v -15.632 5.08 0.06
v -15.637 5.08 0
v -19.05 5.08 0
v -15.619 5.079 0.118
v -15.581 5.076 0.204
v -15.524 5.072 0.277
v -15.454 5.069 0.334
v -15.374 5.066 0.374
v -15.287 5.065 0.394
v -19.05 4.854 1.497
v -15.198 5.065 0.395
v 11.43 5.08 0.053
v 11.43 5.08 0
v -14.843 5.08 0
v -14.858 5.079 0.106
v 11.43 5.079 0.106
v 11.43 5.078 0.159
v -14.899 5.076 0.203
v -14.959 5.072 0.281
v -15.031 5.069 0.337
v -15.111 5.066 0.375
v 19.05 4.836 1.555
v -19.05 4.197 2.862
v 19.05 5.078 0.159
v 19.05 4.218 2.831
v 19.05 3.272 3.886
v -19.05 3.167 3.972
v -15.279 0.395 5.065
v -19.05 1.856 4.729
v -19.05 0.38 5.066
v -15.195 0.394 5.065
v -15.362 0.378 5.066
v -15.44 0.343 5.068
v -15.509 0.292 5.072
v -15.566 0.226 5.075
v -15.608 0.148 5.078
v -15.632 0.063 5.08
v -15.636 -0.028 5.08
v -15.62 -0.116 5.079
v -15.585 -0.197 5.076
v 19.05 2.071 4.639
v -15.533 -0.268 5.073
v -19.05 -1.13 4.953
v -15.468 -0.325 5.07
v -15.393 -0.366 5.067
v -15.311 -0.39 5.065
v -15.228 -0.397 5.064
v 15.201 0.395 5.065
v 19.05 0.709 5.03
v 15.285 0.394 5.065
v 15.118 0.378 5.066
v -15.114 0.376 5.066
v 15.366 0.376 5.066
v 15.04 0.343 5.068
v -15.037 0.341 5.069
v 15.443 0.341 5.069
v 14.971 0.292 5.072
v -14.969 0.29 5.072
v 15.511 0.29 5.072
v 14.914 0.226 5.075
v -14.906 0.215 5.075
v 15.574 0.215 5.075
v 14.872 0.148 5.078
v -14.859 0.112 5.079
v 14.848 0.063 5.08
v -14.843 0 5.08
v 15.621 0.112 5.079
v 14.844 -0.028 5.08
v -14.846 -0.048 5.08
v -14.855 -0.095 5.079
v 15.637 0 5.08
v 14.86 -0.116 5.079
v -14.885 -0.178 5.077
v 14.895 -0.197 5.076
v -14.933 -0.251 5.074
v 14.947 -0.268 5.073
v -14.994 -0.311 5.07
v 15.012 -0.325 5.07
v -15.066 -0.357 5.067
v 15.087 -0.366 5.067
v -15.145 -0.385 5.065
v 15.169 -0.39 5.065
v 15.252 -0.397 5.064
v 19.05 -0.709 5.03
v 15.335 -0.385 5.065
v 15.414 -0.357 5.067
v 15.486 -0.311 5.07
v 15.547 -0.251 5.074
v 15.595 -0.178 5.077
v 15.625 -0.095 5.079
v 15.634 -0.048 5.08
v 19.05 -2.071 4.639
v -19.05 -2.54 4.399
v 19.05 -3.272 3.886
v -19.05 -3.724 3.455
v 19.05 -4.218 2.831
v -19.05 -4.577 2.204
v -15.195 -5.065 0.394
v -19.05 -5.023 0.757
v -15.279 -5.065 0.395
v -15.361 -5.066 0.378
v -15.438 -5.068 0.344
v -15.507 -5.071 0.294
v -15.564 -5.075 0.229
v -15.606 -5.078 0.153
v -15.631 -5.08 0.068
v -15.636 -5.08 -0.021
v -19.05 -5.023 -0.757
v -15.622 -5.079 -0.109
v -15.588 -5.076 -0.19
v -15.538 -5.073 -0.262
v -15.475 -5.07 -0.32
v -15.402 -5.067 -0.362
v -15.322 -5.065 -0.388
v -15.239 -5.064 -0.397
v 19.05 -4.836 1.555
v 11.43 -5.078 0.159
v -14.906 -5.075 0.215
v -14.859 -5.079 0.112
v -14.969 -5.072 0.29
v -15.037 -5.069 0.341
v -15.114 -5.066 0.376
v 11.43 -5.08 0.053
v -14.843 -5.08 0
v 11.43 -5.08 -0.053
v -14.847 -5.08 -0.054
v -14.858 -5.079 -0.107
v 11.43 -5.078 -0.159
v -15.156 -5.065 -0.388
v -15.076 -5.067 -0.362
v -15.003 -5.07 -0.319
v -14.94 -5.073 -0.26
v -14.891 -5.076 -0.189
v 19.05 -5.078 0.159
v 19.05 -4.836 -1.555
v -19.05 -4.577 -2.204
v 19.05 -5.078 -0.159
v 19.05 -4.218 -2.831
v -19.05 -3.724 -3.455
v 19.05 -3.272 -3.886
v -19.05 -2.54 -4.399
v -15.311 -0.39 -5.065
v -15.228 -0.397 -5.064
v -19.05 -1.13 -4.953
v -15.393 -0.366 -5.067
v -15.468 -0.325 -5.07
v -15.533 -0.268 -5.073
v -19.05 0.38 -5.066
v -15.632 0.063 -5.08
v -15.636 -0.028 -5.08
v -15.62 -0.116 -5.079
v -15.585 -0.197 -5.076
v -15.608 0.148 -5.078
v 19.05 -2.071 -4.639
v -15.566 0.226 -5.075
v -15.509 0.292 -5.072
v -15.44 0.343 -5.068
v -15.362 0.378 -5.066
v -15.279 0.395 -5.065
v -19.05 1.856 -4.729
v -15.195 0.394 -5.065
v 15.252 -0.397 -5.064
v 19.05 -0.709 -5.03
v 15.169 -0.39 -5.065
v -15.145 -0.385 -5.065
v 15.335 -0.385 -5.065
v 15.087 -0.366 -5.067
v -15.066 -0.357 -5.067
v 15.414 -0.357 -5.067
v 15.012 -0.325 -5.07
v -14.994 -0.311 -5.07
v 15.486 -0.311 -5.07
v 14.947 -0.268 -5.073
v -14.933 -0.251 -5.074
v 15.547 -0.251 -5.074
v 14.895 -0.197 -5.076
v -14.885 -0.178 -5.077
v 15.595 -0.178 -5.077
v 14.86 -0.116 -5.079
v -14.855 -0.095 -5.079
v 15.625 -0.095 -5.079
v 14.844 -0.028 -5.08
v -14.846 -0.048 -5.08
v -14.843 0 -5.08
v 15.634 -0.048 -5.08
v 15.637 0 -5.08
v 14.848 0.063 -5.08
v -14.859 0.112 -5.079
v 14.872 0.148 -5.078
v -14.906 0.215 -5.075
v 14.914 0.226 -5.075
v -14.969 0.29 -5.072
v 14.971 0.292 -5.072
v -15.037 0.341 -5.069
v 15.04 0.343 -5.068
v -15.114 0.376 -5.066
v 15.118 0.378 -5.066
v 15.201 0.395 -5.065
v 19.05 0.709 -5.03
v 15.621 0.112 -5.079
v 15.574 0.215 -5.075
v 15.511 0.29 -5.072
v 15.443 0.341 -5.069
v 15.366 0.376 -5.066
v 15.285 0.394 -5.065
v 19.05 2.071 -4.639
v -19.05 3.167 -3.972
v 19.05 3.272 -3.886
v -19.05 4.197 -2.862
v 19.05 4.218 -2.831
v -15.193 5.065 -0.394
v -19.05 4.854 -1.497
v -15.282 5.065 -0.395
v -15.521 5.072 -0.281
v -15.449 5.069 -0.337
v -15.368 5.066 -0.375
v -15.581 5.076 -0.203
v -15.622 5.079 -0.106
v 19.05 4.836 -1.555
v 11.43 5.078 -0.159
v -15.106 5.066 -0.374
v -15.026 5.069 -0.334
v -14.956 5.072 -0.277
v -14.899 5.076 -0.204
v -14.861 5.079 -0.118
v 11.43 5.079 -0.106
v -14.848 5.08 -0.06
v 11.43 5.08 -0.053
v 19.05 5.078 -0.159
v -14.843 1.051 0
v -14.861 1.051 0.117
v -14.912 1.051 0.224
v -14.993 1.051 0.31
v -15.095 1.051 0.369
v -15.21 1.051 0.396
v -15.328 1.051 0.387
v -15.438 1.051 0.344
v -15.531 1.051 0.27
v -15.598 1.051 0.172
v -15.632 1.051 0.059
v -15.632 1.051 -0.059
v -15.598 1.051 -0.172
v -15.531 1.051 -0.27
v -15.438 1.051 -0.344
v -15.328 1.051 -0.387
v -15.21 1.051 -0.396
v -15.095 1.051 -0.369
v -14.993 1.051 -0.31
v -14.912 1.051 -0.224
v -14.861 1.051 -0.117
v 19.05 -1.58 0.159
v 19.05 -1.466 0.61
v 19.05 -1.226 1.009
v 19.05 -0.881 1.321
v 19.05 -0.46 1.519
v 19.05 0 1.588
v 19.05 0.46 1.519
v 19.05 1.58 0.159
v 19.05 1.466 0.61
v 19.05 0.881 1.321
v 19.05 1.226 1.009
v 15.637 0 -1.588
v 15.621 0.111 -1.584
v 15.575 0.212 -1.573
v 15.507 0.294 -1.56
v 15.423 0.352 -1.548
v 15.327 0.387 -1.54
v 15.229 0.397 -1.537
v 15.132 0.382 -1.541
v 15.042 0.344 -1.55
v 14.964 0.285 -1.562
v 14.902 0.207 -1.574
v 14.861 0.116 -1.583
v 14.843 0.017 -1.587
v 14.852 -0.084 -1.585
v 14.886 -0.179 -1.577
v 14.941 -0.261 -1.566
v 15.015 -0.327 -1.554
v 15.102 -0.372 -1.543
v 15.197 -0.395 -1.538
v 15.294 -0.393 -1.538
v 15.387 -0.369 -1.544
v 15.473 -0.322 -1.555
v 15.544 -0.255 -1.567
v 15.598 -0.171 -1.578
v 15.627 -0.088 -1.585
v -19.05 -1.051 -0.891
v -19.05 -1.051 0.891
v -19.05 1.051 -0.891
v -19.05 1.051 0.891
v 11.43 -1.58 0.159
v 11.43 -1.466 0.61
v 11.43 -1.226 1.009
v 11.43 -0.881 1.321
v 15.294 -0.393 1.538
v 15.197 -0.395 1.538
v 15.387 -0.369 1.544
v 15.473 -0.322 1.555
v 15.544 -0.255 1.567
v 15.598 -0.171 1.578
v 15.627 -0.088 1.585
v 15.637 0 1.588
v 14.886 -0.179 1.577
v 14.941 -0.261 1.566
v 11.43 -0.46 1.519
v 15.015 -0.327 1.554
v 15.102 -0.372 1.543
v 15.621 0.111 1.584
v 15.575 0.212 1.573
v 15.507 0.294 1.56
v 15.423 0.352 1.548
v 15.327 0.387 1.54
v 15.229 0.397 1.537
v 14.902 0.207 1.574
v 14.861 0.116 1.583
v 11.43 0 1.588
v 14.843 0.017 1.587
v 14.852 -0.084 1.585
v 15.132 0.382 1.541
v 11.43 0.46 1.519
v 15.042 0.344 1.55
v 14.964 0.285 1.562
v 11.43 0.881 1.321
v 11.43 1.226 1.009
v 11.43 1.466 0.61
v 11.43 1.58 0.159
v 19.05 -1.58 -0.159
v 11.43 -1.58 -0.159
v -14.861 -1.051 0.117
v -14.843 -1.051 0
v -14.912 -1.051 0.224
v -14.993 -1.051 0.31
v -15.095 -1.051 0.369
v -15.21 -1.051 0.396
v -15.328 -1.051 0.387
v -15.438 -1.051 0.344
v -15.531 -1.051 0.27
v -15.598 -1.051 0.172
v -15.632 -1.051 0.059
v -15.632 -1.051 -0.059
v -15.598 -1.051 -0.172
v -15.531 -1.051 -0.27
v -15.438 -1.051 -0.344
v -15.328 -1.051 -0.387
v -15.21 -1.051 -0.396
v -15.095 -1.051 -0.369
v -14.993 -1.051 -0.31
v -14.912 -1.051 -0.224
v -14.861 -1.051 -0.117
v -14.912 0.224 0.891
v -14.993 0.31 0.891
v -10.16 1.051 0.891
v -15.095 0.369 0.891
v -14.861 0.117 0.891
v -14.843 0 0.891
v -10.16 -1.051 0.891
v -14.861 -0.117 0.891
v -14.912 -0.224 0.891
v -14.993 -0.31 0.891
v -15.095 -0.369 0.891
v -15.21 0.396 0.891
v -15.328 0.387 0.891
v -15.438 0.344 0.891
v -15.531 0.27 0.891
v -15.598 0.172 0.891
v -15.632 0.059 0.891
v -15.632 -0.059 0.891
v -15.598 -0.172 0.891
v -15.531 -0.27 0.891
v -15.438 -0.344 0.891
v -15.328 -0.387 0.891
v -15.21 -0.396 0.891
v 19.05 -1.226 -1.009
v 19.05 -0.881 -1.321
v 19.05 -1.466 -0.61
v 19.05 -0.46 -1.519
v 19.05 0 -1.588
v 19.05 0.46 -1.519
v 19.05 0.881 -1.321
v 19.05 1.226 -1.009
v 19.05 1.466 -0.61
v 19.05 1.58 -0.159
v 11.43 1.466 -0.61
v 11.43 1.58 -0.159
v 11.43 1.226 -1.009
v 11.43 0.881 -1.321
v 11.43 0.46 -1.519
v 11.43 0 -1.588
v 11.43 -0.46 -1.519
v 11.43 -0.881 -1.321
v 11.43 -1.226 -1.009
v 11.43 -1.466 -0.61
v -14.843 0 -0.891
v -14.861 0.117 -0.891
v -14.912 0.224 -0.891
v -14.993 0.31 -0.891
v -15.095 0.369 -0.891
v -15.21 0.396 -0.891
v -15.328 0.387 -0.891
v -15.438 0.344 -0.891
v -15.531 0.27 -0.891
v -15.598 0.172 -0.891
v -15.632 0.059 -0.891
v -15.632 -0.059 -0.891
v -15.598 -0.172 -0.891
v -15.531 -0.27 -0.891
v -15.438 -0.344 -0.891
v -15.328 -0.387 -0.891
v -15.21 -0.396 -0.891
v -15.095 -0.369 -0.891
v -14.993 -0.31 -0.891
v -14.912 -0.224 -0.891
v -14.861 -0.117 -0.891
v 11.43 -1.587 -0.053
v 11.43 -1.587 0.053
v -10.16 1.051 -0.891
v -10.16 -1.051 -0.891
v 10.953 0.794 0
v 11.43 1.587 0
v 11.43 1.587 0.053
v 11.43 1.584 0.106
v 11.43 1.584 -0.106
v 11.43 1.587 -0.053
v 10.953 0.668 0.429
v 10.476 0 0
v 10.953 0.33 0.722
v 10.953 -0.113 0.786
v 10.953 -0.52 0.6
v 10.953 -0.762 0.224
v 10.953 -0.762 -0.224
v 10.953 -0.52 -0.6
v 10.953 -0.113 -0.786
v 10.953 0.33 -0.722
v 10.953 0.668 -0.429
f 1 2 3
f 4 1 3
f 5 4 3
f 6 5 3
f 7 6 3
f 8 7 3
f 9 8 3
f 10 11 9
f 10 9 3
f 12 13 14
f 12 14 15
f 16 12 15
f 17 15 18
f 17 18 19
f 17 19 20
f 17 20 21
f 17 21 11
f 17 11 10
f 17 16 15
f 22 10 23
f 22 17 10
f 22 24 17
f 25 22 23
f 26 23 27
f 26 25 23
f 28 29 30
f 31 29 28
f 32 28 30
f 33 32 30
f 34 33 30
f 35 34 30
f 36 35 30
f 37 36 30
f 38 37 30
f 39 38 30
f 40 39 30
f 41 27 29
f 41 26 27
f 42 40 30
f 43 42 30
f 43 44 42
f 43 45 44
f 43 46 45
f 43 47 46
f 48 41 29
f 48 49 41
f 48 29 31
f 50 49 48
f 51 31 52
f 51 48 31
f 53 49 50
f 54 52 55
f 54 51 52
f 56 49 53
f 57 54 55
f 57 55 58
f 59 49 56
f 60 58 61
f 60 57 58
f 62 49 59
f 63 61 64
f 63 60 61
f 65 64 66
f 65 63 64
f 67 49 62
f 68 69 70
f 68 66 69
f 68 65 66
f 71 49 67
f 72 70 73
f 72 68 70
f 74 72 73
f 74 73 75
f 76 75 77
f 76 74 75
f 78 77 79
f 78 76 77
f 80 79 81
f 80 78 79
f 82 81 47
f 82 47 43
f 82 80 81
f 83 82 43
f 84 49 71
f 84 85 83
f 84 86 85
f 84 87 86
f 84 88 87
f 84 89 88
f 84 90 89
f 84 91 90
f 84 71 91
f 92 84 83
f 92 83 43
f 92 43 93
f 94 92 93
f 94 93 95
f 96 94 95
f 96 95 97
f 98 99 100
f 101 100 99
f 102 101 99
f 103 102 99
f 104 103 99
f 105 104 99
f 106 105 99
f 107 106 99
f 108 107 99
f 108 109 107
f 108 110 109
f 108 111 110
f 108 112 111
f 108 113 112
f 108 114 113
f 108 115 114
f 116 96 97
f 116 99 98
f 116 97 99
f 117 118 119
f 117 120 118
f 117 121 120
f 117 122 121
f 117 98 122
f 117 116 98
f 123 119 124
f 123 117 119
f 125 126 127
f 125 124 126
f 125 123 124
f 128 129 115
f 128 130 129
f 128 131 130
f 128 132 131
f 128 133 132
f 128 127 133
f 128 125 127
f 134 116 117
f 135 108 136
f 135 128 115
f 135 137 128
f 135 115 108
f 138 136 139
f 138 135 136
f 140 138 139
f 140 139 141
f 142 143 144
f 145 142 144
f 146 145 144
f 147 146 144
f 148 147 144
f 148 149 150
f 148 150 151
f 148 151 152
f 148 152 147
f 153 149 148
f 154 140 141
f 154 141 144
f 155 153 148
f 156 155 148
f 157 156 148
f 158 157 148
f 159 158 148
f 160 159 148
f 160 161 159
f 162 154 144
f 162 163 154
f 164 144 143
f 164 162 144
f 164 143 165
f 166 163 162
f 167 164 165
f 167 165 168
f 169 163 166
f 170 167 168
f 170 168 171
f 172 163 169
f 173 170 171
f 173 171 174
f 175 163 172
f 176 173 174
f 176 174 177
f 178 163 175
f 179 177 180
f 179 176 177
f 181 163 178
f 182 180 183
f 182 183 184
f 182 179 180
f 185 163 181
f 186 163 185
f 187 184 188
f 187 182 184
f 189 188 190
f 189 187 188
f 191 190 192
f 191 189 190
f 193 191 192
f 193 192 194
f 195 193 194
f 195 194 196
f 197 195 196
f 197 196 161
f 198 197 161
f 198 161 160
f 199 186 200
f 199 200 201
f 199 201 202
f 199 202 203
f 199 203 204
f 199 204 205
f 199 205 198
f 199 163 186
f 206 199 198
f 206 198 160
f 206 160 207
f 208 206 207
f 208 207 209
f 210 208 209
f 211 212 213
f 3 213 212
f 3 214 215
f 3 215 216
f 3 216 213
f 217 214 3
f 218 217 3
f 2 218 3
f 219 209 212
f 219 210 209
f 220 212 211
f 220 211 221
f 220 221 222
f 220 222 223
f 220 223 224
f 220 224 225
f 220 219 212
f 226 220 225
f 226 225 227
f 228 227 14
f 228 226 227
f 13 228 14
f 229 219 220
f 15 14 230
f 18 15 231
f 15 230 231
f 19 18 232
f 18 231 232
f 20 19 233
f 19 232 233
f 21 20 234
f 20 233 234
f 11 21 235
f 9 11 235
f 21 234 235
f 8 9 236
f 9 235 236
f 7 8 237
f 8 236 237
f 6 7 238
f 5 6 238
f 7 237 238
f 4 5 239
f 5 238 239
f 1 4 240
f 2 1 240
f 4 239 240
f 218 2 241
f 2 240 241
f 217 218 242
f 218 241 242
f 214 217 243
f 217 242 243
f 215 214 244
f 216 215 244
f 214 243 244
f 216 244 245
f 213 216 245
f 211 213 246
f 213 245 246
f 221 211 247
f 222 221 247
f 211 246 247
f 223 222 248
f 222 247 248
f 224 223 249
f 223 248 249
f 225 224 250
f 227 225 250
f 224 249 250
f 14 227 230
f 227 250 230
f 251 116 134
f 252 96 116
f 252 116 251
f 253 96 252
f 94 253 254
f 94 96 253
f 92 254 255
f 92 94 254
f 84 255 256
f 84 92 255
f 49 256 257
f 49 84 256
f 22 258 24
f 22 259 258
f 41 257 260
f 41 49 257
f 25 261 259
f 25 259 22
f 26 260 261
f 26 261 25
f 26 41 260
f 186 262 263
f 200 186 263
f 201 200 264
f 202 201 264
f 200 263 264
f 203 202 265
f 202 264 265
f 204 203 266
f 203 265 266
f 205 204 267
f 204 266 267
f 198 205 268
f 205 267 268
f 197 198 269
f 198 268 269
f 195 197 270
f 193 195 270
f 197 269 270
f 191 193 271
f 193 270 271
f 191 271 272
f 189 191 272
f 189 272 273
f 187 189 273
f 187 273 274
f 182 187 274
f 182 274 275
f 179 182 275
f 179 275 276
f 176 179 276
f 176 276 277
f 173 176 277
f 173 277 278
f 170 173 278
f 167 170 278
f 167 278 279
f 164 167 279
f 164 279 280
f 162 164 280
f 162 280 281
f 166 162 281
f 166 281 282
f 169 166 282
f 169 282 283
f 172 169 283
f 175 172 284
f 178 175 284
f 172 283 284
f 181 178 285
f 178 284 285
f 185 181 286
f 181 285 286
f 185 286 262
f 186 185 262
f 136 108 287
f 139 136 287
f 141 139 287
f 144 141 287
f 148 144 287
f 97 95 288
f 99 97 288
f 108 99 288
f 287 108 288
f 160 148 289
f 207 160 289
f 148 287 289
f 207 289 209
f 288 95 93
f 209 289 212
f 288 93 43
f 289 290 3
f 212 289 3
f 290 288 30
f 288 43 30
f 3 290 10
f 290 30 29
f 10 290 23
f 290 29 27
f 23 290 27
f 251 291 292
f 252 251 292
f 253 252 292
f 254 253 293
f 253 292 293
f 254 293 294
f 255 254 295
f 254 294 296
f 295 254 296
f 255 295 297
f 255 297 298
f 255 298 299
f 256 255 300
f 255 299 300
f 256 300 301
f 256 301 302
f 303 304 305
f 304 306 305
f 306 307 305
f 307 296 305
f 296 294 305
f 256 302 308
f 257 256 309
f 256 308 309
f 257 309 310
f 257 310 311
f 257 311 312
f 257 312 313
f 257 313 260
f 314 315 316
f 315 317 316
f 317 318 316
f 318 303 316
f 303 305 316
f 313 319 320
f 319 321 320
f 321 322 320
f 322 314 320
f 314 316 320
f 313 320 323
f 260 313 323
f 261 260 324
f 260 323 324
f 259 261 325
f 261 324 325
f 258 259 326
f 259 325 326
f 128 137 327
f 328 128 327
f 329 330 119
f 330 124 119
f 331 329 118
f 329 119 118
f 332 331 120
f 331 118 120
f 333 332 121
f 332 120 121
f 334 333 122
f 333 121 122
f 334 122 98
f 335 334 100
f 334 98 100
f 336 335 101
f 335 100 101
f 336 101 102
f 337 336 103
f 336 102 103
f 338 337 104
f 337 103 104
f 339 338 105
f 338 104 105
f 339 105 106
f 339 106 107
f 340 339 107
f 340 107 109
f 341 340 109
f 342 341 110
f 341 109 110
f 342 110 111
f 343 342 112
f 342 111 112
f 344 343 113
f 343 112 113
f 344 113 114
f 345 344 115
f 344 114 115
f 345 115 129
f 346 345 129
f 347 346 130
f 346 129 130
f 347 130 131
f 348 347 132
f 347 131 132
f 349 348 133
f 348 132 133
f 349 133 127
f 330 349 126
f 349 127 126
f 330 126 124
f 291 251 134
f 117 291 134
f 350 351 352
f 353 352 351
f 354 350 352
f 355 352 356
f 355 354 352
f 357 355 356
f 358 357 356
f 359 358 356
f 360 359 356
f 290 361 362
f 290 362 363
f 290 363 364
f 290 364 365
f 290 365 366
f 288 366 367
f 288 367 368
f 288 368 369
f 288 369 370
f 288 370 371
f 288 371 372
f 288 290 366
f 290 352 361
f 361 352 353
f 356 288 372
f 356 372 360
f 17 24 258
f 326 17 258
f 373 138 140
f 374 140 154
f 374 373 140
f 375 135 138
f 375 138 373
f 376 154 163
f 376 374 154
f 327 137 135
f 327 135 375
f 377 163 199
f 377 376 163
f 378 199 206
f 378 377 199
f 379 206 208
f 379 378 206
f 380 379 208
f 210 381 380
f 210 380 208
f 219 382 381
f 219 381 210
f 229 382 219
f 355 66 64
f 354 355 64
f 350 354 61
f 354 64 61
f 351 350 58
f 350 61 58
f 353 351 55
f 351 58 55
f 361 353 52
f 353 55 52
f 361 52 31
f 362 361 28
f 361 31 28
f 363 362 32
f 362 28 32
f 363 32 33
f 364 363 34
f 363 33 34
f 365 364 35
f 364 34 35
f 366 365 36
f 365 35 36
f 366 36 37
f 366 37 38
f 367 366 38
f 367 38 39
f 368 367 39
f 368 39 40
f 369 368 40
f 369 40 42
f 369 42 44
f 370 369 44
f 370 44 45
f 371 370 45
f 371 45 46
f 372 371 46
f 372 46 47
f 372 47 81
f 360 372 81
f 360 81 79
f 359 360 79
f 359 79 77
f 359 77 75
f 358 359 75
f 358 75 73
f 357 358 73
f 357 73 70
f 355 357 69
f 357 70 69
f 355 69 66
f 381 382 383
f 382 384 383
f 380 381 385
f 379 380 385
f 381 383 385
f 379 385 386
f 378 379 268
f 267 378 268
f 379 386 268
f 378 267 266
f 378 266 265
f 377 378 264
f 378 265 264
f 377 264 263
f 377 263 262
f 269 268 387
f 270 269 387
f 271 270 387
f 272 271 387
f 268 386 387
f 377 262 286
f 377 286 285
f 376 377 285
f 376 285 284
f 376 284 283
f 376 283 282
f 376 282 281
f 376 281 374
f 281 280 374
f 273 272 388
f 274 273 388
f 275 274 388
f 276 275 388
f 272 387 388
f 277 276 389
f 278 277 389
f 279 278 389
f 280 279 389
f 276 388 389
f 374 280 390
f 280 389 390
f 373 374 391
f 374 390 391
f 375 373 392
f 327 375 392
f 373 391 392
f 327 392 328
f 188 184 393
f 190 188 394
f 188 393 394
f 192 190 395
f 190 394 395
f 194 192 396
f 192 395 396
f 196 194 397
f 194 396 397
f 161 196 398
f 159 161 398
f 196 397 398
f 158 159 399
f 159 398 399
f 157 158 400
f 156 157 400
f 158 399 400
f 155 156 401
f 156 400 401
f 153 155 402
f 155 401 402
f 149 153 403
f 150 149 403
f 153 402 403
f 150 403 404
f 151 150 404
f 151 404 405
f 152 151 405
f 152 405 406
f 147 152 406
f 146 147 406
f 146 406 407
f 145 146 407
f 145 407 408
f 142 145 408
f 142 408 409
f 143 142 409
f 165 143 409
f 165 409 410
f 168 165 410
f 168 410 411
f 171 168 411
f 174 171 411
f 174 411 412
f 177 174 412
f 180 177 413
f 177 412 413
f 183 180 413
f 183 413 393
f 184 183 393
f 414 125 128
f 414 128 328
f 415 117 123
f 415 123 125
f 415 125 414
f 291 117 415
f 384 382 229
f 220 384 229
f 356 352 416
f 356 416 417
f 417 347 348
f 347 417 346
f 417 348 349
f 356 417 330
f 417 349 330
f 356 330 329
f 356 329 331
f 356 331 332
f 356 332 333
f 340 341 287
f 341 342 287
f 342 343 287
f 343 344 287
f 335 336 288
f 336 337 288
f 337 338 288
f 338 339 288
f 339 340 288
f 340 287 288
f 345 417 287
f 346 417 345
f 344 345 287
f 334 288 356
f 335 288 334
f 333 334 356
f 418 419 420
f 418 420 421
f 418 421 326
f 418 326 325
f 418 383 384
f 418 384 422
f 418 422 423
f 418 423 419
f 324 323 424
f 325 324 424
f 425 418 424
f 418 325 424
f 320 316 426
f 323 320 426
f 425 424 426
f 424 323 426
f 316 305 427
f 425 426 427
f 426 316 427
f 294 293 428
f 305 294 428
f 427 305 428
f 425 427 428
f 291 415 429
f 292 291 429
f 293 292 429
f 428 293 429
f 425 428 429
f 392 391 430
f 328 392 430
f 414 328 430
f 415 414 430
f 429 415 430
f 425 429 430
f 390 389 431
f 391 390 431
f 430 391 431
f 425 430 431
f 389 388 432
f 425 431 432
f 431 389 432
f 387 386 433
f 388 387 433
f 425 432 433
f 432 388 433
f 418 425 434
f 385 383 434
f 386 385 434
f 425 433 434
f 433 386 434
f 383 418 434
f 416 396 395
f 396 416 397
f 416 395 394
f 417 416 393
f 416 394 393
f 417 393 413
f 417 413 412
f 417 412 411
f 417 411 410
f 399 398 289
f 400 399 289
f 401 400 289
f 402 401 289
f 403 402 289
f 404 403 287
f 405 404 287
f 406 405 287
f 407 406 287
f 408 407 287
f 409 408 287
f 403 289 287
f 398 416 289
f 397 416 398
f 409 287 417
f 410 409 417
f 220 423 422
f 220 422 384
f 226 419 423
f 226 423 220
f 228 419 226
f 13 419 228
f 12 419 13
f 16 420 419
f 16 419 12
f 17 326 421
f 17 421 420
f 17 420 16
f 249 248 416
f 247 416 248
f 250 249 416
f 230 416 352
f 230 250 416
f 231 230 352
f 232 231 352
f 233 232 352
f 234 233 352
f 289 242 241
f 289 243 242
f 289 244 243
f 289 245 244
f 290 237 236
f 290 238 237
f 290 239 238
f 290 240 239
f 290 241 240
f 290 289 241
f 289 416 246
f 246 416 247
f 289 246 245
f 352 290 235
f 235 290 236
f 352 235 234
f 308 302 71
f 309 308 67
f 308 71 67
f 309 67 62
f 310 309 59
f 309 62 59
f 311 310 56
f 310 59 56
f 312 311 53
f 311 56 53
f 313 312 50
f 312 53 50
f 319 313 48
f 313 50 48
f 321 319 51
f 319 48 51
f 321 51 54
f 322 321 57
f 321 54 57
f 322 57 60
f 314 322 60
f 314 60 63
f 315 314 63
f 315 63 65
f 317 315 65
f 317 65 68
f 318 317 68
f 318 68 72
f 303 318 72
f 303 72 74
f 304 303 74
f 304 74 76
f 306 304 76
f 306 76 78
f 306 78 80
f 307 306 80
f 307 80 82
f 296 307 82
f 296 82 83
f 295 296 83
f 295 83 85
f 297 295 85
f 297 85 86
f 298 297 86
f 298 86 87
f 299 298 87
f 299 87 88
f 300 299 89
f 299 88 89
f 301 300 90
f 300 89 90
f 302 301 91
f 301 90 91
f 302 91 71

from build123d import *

# Parameters (mm, degrees)
F0_R      = 5.08
F1_DEPTH  = 19.05
F3_D      = 3.175
F3_DEPTH  = 7.62
F3_TIP    = 0.9538662327
F4_W      = 2.1017943509
F4_H      = 1.7811305588
F5_DEPTH  = 8.89
F7_DEPTH  = 7.62
F9_R      = 0.396875
F10_DEPTH = 17.781
F12_R     = 0.396875
F13_DEPTH = 25.4


with BuildPart() as f1:
    # F0 (on Right) → F1 (new body, symmetric)
    with BuildSketch(Plane.YZ):
        Circle(F0_R)
    extrude(amount=F1_DEPTH, both=True)

    # F3
    with Locations(Plane.YZ.offset(19.05)):
        with Locations((0, 0)):
            Hole(F3_D / 2, depth=F3_DEPTH)
            with Locations((0, 0, -(F3_DEPTH + F3_TIP / 2))):  # 118° drill point
                Cone(0, F3_D / 2, F3_TIP, mode=Mode.SUBTRACT)

    # F4 (on face) → F5 (cut)
    with BuildSketch(Plane(origin=(-19.05, 0, 0), x_dir=(0, -1, 0), z_dir=(-1, 0, 0))):
        Rectangle(F4_W, F4_H)
    extrude(amount=-F5_DEPTH, mode=Mode.SUBTRACT)

    # F6 (on face) → F7 (cut)
    with BuildSketch(Plane.YZ.offset(19.05)):
        with BuildLine():
            ThreePointArc((5.08, 0), (5.0793796935, 0.0793846935), (5.0775189254, 0.15875))
            Line((5.0775189254, 0.15875), (1.5795425564, 0.15875))
            ThreePointArc((1.5795425564, 0.15875), (1.5855093911, 0.0794746554), (1.5875, 0))
            ThreePointArc((1.5875, 0), (1.5855093911, -0.0794746554), (1.5795425564, -0.15875))
            Line((1.5795425564, -0.15875), (5.0775189254, -0.15875))
            ThreePointArc((5.0775189254, -0.15875), (5.0793796935, -0.0793846935), (5.08, 0))
        make_face()
        with BuildLine():
            Line((-1.5795425564, 0.15875), (-5.0775189254, 0.15875))
            ThreePointArc((-5.0775189254, 0.15875), (-5.08, 0), (-5.0775189254, -0.15875))
            Line((-5.0775189254, -0.15875), (-1.5795425564, -0.15875))
            ThreePointArc((-1.5795425564, -0.15875), (-1.5875, 0), (-1.5795425564, 0.15875))
        make_face()
    extrude(amount=-F7_DEPTH, mode=Mode.SUBTRACT)

    # F9 (on offset) → F10 (cut, through all)
    with BuildSketch(Plane.XY.offset(12.7)):
        with Locations((-15.24, 0)):
            Circle(F9_R)
        with Locations((15.24, 0)):
            Circle(F9_R)
    extrude(amount=-F10_DEPTH, mode=Mode.SUBTRACT)

    # F12 (on offset) → F13 (cut)
    with BuildSketch(Plane.XZ.offset(12.7)):
        with Locations((-15.24, 0)):
            Circle(F12_R)
    extrude(amount=-F13_DEPTH, mode=Mode.SUBTRACT)


solid = f1.part
